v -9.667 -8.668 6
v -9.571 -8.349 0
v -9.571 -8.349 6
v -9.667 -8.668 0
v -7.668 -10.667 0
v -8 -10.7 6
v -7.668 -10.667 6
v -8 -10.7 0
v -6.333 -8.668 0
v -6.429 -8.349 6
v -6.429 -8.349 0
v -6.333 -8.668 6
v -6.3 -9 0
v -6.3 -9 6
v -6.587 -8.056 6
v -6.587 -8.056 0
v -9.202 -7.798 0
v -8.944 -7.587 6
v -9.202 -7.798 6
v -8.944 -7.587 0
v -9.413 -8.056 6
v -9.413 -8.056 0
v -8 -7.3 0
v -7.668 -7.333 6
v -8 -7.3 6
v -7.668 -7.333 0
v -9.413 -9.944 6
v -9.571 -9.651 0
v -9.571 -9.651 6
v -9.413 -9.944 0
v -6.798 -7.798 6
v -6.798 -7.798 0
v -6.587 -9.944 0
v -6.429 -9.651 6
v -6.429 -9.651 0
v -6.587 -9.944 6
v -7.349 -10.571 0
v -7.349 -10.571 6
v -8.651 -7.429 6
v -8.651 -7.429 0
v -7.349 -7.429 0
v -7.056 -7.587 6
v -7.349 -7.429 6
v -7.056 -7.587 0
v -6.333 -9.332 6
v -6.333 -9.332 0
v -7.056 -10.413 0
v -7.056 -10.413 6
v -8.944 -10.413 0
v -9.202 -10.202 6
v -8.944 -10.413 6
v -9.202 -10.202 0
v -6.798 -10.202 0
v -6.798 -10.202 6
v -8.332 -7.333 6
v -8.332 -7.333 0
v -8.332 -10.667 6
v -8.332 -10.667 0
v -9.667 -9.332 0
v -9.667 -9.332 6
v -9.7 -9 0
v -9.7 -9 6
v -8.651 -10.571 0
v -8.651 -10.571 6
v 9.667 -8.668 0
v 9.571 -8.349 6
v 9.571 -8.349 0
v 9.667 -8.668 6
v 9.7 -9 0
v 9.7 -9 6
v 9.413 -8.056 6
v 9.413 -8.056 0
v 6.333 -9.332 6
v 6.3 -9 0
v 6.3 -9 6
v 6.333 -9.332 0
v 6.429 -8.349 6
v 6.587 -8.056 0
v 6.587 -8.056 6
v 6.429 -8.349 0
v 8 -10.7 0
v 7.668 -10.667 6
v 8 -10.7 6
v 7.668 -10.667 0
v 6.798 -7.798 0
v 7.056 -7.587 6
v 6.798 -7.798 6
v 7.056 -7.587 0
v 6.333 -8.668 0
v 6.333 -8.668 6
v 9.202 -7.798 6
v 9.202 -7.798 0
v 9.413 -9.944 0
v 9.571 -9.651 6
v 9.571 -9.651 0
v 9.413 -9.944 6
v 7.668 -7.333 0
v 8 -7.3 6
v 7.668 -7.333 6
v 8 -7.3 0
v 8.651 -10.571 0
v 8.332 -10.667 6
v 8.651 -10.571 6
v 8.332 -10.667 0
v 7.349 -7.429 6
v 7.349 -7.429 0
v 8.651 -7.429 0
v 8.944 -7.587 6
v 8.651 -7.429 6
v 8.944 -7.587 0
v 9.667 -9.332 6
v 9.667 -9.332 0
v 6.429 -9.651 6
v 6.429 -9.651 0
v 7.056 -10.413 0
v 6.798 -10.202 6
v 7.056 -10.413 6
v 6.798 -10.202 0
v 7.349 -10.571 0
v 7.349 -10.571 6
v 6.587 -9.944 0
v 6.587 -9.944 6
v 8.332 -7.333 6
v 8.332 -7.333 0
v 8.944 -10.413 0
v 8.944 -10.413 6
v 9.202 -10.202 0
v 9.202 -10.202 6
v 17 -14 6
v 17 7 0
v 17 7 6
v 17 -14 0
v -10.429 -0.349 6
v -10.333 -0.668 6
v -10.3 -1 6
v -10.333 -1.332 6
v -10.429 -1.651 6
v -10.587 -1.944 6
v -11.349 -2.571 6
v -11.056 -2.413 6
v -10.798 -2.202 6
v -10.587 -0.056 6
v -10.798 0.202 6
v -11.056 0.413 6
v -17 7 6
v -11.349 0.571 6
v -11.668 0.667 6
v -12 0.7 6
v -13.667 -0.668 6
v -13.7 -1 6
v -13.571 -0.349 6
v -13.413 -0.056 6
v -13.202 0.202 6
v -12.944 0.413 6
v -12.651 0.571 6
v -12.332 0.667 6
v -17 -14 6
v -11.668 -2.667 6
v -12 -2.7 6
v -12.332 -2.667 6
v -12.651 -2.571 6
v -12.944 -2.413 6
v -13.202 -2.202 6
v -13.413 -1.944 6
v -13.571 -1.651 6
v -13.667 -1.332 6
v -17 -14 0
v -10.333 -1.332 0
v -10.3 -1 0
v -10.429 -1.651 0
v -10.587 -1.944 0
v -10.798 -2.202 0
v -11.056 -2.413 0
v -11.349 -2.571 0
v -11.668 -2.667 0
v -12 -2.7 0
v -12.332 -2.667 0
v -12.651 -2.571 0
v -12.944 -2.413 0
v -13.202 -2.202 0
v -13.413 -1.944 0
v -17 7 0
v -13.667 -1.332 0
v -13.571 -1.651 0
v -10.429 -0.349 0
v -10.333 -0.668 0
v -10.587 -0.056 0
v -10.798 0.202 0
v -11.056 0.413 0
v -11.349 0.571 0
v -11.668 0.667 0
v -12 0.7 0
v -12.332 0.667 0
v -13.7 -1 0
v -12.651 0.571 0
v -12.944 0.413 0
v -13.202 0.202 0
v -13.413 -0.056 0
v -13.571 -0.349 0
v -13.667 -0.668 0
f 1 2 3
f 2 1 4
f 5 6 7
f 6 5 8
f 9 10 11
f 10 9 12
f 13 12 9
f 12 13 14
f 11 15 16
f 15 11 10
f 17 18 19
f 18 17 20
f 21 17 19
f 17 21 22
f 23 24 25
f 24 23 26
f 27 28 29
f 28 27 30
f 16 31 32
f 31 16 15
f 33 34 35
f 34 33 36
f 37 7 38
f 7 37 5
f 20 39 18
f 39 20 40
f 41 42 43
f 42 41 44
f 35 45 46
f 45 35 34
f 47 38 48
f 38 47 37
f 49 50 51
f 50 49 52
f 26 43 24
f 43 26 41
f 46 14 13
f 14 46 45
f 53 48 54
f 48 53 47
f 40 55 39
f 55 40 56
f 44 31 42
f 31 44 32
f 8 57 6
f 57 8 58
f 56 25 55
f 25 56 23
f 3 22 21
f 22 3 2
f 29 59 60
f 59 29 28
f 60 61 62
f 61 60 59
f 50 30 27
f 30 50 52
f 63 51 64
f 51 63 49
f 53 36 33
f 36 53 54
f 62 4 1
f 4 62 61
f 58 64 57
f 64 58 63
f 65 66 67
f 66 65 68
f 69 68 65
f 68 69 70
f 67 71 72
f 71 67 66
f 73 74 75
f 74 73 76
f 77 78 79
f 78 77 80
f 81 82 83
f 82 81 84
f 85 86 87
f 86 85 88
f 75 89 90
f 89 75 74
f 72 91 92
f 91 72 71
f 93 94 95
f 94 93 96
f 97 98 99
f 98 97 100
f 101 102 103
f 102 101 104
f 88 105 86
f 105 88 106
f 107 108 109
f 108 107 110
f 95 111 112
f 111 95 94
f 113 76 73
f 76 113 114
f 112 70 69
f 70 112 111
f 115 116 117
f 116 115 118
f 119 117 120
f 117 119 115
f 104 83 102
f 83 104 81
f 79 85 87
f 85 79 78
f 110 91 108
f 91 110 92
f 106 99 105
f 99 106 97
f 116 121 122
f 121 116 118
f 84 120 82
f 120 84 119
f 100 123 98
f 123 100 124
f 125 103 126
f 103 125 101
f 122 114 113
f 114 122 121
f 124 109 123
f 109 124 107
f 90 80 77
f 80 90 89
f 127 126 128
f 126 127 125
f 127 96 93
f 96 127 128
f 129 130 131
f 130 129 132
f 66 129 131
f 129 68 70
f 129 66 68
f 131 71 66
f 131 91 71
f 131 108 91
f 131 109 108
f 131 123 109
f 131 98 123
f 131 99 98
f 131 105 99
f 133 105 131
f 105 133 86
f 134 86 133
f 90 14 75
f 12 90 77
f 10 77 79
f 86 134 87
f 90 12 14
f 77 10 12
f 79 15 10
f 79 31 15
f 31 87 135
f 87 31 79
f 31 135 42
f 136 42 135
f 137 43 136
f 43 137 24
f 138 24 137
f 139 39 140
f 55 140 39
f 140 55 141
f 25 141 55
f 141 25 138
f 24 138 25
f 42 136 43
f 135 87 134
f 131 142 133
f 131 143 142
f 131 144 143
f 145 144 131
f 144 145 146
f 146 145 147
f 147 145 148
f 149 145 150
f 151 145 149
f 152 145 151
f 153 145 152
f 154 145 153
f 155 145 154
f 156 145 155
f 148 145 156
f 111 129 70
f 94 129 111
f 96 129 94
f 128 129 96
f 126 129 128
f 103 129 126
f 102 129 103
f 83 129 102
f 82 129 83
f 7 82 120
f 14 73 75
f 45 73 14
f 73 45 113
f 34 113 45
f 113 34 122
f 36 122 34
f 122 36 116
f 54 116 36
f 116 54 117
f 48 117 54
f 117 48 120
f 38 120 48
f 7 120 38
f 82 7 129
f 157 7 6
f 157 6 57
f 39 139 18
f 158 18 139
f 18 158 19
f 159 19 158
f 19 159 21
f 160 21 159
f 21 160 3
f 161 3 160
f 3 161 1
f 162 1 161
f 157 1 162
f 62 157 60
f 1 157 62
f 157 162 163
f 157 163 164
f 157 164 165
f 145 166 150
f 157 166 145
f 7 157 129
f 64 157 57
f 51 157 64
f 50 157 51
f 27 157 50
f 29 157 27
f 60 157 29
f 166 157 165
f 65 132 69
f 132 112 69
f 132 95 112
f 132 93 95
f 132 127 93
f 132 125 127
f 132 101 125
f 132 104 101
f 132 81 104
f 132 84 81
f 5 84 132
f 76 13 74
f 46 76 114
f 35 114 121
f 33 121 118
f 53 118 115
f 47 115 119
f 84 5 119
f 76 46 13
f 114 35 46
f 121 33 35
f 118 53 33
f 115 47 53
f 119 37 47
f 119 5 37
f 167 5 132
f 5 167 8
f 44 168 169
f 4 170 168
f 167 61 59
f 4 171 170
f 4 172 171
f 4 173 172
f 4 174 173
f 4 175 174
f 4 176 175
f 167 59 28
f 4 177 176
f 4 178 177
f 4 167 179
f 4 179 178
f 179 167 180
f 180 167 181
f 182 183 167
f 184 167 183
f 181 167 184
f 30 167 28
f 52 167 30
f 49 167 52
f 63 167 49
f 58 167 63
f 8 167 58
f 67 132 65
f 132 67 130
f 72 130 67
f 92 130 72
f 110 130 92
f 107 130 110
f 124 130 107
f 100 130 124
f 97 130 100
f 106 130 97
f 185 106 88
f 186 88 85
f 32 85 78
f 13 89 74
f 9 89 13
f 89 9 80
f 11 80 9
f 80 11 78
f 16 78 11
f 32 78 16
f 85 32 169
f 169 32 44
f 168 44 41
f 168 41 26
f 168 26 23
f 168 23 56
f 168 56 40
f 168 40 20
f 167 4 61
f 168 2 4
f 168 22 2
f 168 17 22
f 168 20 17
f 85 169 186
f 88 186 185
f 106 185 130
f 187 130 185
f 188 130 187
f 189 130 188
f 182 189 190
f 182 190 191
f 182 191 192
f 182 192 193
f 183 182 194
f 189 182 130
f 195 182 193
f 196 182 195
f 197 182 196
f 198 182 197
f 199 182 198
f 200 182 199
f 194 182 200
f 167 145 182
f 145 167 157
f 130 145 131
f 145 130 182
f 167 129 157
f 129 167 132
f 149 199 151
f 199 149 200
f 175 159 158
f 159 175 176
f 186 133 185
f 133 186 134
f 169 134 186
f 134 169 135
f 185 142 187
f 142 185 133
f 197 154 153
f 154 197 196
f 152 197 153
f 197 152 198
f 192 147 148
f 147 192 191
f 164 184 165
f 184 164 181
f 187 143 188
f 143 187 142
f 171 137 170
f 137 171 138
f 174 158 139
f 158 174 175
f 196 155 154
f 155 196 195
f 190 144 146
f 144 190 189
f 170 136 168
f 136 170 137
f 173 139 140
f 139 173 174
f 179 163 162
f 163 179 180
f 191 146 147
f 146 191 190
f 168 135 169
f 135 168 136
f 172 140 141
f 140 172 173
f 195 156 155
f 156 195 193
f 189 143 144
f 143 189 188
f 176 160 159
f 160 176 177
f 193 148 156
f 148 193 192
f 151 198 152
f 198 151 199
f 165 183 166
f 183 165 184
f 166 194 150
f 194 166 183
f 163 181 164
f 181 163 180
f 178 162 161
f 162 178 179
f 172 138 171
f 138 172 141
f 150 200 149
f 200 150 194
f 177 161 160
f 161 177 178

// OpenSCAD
// Column cap holding the Z adjust screw. Print flat. Qty 3, all identical:
// port tower B's cap is this one flipped upside down, which puts the Z adjust
// hole on the other side (tests/check_stage_z_cap_flip.scad).
include <../stage.scad>

translate([-xs_xc, 0, -col_top]) stage_z_cap();
